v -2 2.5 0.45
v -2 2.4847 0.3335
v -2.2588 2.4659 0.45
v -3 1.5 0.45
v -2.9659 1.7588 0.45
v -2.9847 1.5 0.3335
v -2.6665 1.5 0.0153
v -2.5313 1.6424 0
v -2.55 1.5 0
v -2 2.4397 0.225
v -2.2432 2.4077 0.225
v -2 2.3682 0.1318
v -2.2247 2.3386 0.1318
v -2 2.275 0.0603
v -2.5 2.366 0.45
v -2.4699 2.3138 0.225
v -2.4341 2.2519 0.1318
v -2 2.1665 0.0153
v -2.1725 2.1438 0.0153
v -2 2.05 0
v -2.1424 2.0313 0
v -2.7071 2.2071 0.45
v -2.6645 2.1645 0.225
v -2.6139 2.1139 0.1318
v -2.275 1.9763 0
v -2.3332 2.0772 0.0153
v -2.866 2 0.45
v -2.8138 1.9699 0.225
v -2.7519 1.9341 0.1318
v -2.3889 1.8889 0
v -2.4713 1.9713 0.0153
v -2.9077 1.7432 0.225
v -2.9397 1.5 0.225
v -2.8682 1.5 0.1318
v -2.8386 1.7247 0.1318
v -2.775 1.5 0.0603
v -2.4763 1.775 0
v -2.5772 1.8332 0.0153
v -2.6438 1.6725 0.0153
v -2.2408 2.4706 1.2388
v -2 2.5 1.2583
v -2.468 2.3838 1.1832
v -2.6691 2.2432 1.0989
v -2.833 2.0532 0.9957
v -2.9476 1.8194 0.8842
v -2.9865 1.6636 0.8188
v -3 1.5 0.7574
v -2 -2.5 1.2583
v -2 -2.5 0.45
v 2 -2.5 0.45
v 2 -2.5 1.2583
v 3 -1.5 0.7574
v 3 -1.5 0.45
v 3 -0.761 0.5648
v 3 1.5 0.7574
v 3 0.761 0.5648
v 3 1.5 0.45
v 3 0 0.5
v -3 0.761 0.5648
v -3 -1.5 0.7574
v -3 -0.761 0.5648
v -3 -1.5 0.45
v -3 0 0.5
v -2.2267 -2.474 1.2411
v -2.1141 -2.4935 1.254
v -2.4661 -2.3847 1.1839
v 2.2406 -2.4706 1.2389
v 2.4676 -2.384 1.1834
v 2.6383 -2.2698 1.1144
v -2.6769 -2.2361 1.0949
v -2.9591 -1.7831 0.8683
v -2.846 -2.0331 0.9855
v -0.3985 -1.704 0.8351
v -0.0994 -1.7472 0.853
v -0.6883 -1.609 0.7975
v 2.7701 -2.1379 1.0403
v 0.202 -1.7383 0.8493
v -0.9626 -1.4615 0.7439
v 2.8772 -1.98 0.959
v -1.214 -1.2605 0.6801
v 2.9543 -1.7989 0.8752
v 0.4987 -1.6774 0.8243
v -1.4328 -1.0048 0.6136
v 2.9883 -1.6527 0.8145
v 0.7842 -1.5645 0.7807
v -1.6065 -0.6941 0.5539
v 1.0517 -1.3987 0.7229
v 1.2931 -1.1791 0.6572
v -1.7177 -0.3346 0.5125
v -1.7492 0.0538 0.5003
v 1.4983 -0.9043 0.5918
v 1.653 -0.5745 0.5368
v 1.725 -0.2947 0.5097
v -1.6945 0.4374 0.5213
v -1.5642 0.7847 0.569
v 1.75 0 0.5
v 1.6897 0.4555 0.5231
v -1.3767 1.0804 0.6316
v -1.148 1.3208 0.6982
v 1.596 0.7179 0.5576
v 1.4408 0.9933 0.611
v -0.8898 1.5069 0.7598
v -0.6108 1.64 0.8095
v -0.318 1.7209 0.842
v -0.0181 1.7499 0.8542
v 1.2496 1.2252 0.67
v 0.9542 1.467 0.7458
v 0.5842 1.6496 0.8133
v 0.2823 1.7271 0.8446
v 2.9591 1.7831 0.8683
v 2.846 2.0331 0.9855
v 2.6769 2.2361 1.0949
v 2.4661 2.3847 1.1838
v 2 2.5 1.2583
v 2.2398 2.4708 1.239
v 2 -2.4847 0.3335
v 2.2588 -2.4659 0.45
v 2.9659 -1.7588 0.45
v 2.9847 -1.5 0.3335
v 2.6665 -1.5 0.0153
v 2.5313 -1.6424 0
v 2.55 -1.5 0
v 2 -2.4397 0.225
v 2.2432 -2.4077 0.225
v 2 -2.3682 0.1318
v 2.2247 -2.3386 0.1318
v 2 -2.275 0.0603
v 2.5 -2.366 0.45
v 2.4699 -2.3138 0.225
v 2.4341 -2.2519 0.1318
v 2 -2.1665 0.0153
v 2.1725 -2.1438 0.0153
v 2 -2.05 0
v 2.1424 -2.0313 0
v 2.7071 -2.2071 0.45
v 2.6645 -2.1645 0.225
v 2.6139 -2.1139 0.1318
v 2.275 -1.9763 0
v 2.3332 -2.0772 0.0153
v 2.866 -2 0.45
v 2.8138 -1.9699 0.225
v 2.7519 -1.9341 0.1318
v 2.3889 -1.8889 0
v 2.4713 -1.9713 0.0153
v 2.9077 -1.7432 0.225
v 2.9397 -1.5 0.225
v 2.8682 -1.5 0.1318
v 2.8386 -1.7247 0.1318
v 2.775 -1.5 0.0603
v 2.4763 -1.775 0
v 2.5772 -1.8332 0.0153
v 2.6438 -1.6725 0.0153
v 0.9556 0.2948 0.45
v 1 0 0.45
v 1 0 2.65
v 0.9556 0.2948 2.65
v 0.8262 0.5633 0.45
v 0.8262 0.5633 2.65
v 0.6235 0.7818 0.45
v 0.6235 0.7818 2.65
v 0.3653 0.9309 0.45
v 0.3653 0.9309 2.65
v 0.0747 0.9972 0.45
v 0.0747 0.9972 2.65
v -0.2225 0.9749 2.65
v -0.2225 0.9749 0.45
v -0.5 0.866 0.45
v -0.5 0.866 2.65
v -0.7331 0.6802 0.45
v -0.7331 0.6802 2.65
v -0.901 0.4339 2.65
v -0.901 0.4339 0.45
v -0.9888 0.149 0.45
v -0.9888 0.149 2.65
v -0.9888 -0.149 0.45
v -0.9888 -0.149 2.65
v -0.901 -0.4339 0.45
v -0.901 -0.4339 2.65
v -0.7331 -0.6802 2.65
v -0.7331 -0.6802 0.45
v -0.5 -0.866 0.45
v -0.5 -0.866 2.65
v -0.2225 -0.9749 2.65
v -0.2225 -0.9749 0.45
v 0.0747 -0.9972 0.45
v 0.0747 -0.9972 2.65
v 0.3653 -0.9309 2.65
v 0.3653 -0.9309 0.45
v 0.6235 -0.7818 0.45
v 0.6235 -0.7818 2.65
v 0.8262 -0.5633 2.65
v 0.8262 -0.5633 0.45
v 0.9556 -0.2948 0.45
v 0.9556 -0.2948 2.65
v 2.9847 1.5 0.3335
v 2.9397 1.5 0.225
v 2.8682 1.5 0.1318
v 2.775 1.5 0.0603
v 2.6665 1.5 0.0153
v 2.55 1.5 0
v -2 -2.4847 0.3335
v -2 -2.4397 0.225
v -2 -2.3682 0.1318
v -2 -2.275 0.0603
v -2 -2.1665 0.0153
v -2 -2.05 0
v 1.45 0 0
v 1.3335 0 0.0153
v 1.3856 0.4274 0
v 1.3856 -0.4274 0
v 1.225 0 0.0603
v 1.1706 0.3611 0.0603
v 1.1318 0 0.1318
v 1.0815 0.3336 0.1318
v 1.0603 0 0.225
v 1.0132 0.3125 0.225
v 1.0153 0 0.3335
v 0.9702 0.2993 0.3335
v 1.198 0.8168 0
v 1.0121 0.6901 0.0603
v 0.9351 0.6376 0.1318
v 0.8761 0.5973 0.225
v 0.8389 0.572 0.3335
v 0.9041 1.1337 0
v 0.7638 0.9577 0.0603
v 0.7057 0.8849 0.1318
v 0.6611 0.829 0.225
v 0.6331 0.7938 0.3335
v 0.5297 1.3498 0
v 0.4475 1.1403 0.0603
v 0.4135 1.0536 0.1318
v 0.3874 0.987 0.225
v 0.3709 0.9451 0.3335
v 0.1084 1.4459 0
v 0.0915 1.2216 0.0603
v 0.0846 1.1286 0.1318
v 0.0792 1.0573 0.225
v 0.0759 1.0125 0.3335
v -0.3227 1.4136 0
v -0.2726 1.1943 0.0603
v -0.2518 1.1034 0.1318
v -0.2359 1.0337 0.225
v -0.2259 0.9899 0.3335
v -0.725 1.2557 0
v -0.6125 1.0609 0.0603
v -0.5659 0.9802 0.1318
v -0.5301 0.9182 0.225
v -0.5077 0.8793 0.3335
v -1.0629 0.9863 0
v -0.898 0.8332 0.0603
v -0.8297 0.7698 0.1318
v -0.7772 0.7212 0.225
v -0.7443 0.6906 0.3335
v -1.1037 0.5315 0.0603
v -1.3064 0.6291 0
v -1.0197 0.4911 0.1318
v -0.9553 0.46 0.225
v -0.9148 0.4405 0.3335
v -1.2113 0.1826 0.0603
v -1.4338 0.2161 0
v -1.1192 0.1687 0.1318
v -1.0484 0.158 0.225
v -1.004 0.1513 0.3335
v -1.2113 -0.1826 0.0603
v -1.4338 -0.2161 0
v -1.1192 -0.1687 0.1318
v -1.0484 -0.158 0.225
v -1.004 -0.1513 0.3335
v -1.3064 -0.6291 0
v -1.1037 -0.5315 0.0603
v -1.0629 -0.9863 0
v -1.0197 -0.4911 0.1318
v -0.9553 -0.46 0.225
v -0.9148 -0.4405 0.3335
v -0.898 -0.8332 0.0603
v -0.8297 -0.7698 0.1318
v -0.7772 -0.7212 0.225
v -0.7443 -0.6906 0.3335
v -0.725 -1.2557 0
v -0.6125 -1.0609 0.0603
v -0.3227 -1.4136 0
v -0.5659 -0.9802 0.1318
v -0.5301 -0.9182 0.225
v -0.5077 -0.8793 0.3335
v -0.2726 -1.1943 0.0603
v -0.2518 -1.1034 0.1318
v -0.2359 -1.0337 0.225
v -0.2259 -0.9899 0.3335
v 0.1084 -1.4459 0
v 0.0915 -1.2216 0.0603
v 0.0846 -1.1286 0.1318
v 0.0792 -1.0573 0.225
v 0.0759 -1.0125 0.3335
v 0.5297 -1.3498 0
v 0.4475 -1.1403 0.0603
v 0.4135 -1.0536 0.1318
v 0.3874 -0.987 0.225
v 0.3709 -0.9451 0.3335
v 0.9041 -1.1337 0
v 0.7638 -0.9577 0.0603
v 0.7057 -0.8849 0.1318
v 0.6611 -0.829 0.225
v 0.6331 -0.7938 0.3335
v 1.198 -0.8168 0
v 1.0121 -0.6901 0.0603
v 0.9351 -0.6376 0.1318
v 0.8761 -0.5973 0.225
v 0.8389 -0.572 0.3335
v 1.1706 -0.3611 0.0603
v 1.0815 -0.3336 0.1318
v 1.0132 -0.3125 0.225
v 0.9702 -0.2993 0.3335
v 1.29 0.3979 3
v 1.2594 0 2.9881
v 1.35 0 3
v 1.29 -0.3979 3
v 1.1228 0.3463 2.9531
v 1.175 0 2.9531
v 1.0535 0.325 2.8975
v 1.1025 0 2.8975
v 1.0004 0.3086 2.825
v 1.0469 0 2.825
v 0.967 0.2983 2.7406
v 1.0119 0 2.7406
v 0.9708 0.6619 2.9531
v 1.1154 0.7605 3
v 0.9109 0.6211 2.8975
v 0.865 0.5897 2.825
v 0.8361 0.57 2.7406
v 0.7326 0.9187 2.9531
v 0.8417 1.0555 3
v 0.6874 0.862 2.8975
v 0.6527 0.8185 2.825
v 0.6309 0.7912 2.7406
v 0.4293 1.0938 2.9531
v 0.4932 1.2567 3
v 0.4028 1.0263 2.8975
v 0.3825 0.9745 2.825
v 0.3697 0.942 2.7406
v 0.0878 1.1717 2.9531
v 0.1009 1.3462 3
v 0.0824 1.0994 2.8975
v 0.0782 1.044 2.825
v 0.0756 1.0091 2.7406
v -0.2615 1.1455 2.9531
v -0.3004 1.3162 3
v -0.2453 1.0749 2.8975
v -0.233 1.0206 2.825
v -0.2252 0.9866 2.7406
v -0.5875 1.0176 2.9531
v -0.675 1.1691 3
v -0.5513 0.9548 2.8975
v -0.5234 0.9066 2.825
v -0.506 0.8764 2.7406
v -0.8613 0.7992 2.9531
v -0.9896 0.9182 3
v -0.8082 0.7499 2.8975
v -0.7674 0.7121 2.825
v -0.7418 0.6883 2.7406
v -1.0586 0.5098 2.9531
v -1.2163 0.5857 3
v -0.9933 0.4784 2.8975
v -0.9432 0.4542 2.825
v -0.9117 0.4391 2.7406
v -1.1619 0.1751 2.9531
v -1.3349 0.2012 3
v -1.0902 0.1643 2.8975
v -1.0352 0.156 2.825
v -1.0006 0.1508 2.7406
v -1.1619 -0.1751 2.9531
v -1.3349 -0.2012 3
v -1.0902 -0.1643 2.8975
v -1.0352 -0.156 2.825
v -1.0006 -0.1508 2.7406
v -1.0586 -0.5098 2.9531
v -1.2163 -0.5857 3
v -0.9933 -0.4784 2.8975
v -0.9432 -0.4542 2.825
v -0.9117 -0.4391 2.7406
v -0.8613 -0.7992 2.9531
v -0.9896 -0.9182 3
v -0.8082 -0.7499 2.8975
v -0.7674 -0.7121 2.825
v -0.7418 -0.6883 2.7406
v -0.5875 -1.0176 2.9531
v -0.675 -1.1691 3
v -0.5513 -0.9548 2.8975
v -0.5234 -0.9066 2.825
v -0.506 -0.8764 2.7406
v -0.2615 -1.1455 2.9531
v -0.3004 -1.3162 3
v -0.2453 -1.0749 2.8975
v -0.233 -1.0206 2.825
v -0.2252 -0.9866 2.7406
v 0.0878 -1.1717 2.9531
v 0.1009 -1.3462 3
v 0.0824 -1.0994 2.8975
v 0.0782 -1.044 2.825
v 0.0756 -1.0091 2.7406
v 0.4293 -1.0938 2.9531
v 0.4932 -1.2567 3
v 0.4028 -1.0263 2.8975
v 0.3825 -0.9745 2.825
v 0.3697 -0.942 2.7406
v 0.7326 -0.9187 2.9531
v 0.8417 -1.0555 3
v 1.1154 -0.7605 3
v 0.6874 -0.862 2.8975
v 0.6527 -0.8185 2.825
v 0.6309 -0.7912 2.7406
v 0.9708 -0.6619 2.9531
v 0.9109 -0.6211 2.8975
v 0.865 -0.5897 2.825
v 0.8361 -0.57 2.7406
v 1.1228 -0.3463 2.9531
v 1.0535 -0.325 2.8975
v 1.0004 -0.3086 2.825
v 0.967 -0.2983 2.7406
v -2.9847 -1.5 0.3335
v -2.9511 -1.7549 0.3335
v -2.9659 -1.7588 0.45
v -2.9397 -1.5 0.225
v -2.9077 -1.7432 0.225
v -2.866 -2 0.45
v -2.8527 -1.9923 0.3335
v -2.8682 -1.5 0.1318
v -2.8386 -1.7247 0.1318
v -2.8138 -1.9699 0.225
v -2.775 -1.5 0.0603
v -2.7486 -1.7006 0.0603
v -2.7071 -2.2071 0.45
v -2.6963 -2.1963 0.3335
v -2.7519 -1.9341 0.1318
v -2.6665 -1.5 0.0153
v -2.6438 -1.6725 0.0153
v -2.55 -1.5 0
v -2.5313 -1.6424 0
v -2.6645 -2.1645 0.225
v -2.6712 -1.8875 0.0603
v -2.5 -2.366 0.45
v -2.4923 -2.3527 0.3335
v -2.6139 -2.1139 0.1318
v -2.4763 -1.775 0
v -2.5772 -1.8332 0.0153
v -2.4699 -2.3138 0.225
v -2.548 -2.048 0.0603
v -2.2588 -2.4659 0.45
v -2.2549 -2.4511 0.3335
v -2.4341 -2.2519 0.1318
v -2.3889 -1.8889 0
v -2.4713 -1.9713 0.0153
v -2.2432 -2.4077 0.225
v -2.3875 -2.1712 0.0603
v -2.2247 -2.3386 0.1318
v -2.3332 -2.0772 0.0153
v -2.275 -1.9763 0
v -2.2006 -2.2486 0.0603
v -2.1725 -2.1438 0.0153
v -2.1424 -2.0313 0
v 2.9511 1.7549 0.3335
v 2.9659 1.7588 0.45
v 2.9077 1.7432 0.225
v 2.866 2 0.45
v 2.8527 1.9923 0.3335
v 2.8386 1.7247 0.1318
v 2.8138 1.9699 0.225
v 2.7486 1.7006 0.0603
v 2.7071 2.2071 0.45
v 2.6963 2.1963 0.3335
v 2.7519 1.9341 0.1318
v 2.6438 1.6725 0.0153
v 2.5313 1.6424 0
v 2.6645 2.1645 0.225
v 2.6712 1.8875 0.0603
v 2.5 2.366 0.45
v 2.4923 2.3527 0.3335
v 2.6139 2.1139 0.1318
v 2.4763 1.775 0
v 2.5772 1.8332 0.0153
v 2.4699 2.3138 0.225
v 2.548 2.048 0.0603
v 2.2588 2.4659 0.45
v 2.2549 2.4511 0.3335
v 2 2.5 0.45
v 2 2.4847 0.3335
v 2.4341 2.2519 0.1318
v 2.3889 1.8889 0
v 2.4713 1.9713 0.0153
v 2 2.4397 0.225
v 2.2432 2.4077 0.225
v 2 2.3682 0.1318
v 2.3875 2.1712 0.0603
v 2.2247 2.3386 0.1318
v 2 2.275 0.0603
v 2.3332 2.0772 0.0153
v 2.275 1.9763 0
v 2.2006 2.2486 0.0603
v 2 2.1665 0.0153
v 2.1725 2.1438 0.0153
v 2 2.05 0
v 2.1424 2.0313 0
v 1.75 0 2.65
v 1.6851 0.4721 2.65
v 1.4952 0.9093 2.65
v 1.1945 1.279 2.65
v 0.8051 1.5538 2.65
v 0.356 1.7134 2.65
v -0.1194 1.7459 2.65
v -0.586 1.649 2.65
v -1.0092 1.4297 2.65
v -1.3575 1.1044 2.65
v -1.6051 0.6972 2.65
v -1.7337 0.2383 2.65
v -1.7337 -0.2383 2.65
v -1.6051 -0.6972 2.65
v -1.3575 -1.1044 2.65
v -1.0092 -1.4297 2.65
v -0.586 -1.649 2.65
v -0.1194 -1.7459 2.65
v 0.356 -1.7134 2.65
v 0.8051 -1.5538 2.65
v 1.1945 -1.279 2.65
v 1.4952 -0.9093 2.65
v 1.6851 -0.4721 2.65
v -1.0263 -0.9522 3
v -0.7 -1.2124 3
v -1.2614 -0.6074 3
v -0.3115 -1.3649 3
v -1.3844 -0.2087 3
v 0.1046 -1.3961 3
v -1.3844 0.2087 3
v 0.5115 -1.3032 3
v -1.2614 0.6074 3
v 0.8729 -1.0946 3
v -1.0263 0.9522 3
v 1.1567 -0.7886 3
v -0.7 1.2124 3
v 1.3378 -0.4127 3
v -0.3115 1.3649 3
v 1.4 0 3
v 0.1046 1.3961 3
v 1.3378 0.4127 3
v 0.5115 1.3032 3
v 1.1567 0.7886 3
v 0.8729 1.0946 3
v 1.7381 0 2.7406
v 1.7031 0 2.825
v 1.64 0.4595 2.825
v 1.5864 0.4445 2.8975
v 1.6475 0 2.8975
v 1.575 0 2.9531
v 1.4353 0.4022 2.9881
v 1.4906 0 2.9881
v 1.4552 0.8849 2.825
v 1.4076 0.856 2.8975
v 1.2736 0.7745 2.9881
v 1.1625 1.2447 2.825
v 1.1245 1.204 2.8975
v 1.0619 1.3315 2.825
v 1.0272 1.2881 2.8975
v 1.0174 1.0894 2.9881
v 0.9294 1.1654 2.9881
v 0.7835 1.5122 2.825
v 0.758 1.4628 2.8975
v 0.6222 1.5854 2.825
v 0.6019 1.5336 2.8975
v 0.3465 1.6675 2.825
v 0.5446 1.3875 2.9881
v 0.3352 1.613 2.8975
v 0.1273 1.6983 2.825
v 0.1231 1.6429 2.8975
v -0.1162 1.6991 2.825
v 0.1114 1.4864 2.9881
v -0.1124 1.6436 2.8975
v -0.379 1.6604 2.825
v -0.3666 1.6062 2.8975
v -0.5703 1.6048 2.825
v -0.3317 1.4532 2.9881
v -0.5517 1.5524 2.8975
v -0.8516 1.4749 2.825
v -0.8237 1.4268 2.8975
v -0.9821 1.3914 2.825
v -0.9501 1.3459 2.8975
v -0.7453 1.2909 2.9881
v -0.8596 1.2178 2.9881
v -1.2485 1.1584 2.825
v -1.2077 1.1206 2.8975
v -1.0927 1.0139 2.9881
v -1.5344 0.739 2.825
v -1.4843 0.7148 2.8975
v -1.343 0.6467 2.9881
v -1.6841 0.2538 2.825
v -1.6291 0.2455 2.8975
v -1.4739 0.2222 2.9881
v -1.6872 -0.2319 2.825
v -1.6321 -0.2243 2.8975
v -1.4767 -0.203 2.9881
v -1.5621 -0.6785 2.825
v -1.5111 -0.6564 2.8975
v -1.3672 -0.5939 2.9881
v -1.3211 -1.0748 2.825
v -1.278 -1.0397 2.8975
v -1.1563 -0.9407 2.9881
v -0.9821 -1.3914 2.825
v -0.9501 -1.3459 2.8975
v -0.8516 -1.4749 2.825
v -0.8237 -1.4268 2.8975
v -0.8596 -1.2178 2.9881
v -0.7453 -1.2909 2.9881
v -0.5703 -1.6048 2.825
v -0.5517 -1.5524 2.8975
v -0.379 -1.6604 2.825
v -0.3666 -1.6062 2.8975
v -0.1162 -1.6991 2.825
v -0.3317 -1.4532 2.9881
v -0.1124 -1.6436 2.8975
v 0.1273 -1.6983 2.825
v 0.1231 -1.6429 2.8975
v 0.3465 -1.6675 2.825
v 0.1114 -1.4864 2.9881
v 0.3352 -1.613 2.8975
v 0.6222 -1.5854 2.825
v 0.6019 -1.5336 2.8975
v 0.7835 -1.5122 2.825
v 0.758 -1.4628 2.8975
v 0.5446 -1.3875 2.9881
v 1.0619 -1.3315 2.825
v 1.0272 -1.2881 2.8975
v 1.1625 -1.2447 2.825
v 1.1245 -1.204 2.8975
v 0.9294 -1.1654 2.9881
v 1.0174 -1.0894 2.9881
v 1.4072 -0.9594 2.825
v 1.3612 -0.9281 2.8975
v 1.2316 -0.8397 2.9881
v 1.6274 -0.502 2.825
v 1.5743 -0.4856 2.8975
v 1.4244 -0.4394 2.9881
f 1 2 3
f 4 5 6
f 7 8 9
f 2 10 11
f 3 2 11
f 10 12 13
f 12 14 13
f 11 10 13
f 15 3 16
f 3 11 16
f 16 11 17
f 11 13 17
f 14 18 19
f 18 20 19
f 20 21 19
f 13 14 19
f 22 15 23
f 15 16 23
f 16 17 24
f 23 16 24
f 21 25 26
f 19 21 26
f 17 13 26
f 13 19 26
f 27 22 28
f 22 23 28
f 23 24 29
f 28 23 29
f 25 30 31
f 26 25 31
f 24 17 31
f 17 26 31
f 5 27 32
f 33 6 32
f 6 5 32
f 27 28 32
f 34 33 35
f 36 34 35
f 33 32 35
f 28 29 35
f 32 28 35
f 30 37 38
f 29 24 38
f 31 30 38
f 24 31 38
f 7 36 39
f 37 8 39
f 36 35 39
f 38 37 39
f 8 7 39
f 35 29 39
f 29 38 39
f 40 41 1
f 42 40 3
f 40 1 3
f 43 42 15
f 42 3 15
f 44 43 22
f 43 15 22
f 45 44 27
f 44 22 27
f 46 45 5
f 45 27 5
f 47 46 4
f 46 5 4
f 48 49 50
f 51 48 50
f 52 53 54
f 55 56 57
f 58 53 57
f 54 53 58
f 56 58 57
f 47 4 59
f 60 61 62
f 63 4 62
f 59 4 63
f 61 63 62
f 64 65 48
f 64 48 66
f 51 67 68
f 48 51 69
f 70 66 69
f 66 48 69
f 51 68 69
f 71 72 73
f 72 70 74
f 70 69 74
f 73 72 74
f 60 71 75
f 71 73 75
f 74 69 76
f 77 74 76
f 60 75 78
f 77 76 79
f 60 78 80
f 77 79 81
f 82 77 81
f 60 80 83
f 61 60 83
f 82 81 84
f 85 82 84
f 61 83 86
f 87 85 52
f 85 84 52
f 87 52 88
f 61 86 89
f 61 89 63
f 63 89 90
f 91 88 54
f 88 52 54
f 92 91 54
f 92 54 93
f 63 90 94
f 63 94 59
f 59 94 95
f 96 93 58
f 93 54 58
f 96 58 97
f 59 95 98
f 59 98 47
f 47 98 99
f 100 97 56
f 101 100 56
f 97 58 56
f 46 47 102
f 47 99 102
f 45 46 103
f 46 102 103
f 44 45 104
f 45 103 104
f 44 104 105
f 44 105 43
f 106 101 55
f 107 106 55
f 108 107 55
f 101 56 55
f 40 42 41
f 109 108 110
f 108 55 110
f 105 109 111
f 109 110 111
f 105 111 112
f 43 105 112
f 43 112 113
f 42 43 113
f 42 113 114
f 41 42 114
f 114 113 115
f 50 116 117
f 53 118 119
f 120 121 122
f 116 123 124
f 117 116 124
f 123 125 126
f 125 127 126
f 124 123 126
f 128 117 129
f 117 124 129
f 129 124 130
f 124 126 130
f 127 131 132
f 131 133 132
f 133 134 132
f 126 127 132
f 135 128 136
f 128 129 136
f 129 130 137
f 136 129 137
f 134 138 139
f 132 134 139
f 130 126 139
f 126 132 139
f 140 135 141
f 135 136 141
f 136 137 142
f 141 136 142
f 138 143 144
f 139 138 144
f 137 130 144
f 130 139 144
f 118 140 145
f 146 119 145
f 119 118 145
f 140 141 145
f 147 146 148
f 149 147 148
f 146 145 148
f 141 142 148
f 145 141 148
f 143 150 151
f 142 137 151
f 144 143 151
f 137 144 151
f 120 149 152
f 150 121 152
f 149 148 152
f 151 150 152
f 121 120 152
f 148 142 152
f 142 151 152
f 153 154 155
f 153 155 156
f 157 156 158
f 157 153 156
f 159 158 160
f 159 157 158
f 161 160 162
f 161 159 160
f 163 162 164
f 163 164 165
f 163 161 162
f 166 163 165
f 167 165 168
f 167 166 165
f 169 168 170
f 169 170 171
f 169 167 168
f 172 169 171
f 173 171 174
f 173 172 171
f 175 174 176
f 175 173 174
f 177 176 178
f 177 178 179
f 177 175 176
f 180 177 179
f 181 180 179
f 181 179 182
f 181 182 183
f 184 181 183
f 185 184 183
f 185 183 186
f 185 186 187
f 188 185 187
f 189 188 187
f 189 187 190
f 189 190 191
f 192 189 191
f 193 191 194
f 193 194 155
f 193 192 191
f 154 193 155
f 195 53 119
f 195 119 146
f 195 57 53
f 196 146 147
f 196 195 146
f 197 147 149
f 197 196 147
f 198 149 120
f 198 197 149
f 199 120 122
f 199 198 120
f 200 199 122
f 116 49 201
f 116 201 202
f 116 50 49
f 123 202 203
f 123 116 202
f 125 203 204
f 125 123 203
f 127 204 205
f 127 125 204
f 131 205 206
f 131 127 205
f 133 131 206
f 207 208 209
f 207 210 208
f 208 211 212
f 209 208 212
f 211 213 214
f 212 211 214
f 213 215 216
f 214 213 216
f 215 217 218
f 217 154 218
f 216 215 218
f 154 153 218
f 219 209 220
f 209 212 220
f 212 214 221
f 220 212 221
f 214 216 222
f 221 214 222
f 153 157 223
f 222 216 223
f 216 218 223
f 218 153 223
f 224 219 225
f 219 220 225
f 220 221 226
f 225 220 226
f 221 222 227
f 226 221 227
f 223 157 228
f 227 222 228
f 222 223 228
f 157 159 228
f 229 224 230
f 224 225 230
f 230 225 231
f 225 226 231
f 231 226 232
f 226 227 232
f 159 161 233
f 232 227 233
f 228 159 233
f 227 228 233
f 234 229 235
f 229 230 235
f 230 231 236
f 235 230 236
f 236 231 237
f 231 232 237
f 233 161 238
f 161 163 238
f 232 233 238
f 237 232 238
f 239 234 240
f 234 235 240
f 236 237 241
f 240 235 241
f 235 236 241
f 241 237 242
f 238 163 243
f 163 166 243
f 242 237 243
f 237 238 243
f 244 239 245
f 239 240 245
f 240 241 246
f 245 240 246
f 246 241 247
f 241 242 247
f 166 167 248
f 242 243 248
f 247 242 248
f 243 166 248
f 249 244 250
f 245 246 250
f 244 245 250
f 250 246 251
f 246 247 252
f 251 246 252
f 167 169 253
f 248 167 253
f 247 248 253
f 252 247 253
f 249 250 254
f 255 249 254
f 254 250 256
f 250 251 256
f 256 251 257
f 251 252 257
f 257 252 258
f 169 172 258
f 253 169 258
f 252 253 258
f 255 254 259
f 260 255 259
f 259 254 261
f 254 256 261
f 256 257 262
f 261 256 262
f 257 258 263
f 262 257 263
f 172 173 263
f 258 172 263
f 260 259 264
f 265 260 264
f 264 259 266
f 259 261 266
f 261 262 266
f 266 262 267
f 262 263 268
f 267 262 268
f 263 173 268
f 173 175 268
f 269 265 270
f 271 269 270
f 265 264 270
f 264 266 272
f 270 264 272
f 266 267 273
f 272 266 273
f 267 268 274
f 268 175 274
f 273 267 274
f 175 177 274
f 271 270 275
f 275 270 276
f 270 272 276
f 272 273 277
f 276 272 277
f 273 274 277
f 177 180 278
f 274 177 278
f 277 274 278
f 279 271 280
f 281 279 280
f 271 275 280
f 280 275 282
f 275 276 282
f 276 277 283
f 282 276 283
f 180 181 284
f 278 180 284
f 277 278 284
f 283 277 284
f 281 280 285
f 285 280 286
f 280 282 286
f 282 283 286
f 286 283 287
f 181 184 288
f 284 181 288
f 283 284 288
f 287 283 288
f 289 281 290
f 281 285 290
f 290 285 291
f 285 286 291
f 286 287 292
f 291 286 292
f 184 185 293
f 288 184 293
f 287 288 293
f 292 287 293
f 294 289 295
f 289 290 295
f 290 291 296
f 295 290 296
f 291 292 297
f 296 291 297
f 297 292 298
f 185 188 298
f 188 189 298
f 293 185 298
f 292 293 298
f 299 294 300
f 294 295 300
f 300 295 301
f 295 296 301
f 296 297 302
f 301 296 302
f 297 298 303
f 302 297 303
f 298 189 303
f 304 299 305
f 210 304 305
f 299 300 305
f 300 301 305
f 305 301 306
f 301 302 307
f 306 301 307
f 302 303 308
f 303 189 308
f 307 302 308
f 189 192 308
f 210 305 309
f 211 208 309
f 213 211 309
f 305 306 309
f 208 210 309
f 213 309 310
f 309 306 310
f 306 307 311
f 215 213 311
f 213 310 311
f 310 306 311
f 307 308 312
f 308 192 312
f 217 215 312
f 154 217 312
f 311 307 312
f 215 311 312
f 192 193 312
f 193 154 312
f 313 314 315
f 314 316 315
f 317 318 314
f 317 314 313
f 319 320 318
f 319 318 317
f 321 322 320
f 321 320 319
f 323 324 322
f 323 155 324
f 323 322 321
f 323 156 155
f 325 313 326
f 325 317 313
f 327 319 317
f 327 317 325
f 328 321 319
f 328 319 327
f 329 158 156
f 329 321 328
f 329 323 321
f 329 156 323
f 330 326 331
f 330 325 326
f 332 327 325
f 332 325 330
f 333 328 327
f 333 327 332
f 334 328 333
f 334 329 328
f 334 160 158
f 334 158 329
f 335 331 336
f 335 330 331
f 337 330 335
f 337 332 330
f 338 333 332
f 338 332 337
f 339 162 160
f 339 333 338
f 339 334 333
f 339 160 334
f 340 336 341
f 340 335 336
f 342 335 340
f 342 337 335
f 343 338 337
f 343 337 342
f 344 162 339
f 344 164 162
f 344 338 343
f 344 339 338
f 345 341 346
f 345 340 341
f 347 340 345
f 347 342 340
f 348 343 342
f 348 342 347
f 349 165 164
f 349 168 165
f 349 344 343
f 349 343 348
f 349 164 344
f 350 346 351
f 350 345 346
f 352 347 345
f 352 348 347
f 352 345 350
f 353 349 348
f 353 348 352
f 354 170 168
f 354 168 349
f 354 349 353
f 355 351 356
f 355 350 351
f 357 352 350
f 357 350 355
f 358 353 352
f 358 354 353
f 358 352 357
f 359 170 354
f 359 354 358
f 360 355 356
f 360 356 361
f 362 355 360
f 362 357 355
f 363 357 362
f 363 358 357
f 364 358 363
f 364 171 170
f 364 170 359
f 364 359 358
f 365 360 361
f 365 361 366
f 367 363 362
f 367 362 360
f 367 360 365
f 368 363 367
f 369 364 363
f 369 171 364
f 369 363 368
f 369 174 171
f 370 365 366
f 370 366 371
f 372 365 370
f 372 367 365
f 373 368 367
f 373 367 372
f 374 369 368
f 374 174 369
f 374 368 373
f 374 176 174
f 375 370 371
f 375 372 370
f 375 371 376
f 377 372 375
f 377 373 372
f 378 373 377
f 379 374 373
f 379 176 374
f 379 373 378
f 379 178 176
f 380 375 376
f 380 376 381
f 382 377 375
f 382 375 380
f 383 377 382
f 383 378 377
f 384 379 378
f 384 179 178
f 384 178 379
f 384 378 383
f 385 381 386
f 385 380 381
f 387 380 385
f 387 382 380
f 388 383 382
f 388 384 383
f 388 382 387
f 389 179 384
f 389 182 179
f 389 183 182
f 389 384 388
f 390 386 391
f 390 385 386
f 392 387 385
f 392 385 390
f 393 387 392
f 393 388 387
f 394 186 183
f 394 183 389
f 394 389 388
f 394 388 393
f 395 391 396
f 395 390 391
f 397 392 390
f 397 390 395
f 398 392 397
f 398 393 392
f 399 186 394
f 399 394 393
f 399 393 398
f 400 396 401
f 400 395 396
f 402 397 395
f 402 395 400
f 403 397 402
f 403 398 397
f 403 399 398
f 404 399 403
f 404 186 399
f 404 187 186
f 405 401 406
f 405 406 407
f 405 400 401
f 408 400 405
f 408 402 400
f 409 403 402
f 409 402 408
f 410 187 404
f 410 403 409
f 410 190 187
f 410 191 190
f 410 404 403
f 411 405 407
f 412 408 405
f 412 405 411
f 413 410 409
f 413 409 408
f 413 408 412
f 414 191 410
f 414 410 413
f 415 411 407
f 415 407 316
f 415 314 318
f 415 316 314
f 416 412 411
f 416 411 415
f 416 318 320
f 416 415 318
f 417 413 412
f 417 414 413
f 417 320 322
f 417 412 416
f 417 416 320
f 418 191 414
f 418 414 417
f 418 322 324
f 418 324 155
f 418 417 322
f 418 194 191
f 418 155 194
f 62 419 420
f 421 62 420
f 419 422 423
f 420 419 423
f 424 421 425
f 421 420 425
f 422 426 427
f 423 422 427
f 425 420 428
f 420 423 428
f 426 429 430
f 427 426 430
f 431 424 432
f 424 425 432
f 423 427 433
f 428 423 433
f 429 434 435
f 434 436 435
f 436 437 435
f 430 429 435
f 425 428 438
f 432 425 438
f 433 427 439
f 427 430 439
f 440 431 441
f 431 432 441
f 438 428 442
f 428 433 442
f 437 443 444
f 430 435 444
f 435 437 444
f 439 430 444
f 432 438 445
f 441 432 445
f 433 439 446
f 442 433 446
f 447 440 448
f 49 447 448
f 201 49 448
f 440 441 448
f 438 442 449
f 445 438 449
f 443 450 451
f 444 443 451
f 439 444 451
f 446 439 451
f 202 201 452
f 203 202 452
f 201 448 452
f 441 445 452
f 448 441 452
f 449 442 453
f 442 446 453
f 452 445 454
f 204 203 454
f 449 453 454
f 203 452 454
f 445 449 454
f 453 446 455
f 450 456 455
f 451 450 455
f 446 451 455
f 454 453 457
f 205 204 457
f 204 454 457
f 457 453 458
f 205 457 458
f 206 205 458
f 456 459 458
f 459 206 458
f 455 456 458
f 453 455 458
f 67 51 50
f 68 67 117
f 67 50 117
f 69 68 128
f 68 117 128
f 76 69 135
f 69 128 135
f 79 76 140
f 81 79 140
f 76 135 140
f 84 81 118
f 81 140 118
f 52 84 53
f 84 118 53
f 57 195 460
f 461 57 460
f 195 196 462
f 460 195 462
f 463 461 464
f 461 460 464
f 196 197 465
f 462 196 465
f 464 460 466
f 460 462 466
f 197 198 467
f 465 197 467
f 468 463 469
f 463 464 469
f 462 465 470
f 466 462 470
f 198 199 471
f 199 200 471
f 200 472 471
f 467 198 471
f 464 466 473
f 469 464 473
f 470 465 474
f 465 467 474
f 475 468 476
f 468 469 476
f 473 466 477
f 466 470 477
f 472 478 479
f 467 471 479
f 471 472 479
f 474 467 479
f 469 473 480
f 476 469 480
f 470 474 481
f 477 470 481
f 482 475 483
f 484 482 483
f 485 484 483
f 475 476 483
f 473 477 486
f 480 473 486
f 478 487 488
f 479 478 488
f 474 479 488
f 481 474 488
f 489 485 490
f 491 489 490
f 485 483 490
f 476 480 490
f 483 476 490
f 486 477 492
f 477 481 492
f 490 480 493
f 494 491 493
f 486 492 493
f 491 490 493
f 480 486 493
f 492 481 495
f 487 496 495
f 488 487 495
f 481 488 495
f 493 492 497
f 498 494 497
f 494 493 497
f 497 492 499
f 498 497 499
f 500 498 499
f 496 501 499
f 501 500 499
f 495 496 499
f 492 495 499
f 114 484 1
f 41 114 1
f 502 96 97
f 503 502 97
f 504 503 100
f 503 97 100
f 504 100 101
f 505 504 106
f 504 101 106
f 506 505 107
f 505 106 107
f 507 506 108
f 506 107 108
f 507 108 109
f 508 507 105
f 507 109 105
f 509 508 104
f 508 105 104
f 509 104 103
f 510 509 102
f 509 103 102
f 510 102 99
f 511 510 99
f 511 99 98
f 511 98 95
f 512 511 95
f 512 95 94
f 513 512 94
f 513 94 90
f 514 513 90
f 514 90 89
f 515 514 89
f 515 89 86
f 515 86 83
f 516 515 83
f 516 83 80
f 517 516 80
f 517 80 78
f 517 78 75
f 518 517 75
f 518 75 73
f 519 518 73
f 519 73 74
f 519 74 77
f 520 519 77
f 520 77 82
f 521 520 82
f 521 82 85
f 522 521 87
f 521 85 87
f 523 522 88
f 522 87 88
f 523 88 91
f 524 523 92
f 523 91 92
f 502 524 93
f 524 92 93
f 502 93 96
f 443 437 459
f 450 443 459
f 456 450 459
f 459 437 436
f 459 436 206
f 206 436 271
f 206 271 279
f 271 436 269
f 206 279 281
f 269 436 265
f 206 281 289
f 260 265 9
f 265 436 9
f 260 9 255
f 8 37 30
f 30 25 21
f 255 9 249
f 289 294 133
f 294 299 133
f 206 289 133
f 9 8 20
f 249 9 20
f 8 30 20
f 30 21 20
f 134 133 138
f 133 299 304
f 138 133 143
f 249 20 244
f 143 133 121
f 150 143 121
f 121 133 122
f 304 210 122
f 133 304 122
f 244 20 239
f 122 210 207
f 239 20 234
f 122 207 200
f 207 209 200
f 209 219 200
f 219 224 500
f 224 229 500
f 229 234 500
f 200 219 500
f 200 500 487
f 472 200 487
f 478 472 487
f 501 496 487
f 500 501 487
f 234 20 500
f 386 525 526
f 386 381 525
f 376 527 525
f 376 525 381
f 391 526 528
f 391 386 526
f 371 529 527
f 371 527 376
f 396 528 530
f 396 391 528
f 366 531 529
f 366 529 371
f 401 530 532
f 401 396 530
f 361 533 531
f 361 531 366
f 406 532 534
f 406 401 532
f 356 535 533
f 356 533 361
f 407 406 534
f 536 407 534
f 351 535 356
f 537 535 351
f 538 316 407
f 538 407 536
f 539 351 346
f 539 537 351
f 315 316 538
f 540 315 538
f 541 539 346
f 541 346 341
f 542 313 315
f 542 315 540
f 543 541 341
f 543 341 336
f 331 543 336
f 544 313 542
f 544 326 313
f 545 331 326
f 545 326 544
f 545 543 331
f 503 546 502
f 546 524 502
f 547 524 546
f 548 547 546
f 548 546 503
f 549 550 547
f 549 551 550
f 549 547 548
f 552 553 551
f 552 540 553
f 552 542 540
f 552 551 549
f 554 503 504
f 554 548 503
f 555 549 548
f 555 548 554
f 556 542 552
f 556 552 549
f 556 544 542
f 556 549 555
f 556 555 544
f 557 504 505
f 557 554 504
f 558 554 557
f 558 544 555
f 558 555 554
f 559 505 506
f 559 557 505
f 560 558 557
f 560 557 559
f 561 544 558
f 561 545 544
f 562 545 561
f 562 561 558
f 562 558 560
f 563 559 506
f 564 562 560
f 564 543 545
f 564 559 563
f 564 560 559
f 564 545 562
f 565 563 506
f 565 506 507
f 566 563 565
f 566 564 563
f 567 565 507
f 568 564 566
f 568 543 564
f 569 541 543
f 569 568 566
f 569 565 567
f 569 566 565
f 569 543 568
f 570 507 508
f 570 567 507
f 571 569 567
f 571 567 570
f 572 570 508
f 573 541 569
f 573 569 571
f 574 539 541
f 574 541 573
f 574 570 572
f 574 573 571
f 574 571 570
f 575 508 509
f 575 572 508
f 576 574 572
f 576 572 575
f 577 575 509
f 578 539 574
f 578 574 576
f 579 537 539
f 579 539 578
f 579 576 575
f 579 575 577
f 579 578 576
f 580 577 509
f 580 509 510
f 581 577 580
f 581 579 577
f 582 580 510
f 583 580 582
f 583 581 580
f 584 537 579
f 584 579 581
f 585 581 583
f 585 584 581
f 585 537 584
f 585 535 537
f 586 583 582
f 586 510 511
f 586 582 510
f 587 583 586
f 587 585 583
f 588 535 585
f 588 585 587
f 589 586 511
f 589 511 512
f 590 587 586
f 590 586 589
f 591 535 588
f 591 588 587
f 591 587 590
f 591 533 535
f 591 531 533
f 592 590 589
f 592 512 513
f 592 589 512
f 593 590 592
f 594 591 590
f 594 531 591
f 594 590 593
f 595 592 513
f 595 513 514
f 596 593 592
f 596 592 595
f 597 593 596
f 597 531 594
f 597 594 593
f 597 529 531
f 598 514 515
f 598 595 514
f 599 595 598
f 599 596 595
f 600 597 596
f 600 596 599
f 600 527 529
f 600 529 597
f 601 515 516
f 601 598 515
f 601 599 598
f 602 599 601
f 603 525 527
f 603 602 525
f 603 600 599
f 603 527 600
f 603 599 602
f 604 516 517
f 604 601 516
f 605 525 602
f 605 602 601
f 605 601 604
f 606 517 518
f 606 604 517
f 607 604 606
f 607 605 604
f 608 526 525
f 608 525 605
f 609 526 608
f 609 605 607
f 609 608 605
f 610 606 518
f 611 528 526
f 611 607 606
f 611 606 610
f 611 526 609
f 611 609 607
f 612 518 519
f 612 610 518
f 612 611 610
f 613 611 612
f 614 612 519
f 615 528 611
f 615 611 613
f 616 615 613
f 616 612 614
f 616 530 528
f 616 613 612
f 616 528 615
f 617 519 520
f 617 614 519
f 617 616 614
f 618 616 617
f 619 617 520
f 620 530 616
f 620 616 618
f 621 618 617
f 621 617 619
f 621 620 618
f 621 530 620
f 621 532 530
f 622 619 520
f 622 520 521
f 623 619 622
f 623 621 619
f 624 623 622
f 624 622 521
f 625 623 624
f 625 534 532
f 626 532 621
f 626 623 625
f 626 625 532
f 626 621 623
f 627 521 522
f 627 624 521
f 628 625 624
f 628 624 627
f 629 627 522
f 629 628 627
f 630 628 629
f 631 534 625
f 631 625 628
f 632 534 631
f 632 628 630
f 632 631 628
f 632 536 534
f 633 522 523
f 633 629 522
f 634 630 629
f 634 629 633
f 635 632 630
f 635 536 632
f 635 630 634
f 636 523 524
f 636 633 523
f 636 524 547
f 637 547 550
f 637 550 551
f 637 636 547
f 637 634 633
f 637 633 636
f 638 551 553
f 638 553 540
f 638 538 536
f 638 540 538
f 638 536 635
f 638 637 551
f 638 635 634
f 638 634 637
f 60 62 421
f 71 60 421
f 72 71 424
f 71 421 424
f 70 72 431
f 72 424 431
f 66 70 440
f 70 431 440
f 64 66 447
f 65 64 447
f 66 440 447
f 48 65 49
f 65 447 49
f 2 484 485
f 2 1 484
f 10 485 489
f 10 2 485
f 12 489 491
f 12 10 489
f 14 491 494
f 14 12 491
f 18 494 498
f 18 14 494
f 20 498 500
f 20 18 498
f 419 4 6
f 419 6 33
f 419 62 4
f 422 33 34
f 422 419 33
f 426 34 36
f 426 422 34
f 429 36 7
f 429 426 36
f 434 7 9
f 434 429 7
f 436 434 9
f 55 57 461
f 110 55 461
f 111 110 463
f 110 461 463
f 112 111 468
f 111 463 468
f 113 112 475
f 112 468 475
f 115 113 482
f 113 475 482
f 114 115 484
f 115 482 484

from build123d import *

# Parameters (mm, degrees)
F0_R     = 1.75
F1_DEPTH = 3
F2_R     = 4.5
F3_DEPTH = 12.5
F4_R     = 1.75
F4_R_2   = 1
F5_DEPTH = 3
F6_R     = 0.35
F7_R     = 0.45


with BuildPart() as f1:
    # F0 (on Top) → F1 (new body)
    with BuildSketch(Plane.XY):
        with BuildLine():
            Line((2, 2.5), (-2, 2.5))
            ThreePointArc((-2, 2.5), (-2.707107, 2.207107), (-3, 1.5))
            Line((-3, 1.5), (-3, -1.5))
            ThreePointArc((-3, -1.5), (-2.707107, -2.207107), (-2, -2.5))
            Line((-2, -2.5), (2, -2.5))
            ThreePointArc((2, -2.5), (2.707107, -2.207107), (3, -1.5))
            Line((3, -1.5), (3, 1.5))
            ThreePointArc((3, 1.5), (2.707107, 2.207107), (2, 2.5))
        make_face()
        Circle(F0_R, mode=Mode.SUBTRACT)
    extrude(amount=F1_DEPTH)

    # F2 (on Right) → F3 (cut, symmetric)
    with BuildSketch(Plane.YZ):
        with Locations((0, 5)):
            Circle(F2_R)
    extrude(amount=F3_DEPTH, both=True, mode=Mode.SUBTRACT)

    # F4 (on Top) → F5 (join)
    with BuildSketch(Plane.XY):
        Circle(F4_R)
        Circle(F4_R_2, mode=Mode.SUBTRACT)
    extrude(amount=F5_DEPTH)

    # F6
    f6_edges = [f1.edges().sort_by_distance(p)[0] for p in [
        (-1.75, 0, 3),
        (-1, 0, 3),
    ]]
    fillet(f6_edges, radius=F6_R)

    # F7
    f7_edges = [f1.edges().sort_by_distance(p)[0] for p in [
        (-1, 0, 0),
        (0, 2.5, 0),
        (-2.707107, 2.207107, 0),
        (-3, 0, 0),
        (-2.707107, -2.207107, 0),
        (0, -2.5, 0),
        (2.707107, -2.207107, 0),
        (3, 0, 0),
        (2.707107, 2.207107, 0),
    ]]
    fillet(f7_edges, radius=F7_R)


solid = f1.part
